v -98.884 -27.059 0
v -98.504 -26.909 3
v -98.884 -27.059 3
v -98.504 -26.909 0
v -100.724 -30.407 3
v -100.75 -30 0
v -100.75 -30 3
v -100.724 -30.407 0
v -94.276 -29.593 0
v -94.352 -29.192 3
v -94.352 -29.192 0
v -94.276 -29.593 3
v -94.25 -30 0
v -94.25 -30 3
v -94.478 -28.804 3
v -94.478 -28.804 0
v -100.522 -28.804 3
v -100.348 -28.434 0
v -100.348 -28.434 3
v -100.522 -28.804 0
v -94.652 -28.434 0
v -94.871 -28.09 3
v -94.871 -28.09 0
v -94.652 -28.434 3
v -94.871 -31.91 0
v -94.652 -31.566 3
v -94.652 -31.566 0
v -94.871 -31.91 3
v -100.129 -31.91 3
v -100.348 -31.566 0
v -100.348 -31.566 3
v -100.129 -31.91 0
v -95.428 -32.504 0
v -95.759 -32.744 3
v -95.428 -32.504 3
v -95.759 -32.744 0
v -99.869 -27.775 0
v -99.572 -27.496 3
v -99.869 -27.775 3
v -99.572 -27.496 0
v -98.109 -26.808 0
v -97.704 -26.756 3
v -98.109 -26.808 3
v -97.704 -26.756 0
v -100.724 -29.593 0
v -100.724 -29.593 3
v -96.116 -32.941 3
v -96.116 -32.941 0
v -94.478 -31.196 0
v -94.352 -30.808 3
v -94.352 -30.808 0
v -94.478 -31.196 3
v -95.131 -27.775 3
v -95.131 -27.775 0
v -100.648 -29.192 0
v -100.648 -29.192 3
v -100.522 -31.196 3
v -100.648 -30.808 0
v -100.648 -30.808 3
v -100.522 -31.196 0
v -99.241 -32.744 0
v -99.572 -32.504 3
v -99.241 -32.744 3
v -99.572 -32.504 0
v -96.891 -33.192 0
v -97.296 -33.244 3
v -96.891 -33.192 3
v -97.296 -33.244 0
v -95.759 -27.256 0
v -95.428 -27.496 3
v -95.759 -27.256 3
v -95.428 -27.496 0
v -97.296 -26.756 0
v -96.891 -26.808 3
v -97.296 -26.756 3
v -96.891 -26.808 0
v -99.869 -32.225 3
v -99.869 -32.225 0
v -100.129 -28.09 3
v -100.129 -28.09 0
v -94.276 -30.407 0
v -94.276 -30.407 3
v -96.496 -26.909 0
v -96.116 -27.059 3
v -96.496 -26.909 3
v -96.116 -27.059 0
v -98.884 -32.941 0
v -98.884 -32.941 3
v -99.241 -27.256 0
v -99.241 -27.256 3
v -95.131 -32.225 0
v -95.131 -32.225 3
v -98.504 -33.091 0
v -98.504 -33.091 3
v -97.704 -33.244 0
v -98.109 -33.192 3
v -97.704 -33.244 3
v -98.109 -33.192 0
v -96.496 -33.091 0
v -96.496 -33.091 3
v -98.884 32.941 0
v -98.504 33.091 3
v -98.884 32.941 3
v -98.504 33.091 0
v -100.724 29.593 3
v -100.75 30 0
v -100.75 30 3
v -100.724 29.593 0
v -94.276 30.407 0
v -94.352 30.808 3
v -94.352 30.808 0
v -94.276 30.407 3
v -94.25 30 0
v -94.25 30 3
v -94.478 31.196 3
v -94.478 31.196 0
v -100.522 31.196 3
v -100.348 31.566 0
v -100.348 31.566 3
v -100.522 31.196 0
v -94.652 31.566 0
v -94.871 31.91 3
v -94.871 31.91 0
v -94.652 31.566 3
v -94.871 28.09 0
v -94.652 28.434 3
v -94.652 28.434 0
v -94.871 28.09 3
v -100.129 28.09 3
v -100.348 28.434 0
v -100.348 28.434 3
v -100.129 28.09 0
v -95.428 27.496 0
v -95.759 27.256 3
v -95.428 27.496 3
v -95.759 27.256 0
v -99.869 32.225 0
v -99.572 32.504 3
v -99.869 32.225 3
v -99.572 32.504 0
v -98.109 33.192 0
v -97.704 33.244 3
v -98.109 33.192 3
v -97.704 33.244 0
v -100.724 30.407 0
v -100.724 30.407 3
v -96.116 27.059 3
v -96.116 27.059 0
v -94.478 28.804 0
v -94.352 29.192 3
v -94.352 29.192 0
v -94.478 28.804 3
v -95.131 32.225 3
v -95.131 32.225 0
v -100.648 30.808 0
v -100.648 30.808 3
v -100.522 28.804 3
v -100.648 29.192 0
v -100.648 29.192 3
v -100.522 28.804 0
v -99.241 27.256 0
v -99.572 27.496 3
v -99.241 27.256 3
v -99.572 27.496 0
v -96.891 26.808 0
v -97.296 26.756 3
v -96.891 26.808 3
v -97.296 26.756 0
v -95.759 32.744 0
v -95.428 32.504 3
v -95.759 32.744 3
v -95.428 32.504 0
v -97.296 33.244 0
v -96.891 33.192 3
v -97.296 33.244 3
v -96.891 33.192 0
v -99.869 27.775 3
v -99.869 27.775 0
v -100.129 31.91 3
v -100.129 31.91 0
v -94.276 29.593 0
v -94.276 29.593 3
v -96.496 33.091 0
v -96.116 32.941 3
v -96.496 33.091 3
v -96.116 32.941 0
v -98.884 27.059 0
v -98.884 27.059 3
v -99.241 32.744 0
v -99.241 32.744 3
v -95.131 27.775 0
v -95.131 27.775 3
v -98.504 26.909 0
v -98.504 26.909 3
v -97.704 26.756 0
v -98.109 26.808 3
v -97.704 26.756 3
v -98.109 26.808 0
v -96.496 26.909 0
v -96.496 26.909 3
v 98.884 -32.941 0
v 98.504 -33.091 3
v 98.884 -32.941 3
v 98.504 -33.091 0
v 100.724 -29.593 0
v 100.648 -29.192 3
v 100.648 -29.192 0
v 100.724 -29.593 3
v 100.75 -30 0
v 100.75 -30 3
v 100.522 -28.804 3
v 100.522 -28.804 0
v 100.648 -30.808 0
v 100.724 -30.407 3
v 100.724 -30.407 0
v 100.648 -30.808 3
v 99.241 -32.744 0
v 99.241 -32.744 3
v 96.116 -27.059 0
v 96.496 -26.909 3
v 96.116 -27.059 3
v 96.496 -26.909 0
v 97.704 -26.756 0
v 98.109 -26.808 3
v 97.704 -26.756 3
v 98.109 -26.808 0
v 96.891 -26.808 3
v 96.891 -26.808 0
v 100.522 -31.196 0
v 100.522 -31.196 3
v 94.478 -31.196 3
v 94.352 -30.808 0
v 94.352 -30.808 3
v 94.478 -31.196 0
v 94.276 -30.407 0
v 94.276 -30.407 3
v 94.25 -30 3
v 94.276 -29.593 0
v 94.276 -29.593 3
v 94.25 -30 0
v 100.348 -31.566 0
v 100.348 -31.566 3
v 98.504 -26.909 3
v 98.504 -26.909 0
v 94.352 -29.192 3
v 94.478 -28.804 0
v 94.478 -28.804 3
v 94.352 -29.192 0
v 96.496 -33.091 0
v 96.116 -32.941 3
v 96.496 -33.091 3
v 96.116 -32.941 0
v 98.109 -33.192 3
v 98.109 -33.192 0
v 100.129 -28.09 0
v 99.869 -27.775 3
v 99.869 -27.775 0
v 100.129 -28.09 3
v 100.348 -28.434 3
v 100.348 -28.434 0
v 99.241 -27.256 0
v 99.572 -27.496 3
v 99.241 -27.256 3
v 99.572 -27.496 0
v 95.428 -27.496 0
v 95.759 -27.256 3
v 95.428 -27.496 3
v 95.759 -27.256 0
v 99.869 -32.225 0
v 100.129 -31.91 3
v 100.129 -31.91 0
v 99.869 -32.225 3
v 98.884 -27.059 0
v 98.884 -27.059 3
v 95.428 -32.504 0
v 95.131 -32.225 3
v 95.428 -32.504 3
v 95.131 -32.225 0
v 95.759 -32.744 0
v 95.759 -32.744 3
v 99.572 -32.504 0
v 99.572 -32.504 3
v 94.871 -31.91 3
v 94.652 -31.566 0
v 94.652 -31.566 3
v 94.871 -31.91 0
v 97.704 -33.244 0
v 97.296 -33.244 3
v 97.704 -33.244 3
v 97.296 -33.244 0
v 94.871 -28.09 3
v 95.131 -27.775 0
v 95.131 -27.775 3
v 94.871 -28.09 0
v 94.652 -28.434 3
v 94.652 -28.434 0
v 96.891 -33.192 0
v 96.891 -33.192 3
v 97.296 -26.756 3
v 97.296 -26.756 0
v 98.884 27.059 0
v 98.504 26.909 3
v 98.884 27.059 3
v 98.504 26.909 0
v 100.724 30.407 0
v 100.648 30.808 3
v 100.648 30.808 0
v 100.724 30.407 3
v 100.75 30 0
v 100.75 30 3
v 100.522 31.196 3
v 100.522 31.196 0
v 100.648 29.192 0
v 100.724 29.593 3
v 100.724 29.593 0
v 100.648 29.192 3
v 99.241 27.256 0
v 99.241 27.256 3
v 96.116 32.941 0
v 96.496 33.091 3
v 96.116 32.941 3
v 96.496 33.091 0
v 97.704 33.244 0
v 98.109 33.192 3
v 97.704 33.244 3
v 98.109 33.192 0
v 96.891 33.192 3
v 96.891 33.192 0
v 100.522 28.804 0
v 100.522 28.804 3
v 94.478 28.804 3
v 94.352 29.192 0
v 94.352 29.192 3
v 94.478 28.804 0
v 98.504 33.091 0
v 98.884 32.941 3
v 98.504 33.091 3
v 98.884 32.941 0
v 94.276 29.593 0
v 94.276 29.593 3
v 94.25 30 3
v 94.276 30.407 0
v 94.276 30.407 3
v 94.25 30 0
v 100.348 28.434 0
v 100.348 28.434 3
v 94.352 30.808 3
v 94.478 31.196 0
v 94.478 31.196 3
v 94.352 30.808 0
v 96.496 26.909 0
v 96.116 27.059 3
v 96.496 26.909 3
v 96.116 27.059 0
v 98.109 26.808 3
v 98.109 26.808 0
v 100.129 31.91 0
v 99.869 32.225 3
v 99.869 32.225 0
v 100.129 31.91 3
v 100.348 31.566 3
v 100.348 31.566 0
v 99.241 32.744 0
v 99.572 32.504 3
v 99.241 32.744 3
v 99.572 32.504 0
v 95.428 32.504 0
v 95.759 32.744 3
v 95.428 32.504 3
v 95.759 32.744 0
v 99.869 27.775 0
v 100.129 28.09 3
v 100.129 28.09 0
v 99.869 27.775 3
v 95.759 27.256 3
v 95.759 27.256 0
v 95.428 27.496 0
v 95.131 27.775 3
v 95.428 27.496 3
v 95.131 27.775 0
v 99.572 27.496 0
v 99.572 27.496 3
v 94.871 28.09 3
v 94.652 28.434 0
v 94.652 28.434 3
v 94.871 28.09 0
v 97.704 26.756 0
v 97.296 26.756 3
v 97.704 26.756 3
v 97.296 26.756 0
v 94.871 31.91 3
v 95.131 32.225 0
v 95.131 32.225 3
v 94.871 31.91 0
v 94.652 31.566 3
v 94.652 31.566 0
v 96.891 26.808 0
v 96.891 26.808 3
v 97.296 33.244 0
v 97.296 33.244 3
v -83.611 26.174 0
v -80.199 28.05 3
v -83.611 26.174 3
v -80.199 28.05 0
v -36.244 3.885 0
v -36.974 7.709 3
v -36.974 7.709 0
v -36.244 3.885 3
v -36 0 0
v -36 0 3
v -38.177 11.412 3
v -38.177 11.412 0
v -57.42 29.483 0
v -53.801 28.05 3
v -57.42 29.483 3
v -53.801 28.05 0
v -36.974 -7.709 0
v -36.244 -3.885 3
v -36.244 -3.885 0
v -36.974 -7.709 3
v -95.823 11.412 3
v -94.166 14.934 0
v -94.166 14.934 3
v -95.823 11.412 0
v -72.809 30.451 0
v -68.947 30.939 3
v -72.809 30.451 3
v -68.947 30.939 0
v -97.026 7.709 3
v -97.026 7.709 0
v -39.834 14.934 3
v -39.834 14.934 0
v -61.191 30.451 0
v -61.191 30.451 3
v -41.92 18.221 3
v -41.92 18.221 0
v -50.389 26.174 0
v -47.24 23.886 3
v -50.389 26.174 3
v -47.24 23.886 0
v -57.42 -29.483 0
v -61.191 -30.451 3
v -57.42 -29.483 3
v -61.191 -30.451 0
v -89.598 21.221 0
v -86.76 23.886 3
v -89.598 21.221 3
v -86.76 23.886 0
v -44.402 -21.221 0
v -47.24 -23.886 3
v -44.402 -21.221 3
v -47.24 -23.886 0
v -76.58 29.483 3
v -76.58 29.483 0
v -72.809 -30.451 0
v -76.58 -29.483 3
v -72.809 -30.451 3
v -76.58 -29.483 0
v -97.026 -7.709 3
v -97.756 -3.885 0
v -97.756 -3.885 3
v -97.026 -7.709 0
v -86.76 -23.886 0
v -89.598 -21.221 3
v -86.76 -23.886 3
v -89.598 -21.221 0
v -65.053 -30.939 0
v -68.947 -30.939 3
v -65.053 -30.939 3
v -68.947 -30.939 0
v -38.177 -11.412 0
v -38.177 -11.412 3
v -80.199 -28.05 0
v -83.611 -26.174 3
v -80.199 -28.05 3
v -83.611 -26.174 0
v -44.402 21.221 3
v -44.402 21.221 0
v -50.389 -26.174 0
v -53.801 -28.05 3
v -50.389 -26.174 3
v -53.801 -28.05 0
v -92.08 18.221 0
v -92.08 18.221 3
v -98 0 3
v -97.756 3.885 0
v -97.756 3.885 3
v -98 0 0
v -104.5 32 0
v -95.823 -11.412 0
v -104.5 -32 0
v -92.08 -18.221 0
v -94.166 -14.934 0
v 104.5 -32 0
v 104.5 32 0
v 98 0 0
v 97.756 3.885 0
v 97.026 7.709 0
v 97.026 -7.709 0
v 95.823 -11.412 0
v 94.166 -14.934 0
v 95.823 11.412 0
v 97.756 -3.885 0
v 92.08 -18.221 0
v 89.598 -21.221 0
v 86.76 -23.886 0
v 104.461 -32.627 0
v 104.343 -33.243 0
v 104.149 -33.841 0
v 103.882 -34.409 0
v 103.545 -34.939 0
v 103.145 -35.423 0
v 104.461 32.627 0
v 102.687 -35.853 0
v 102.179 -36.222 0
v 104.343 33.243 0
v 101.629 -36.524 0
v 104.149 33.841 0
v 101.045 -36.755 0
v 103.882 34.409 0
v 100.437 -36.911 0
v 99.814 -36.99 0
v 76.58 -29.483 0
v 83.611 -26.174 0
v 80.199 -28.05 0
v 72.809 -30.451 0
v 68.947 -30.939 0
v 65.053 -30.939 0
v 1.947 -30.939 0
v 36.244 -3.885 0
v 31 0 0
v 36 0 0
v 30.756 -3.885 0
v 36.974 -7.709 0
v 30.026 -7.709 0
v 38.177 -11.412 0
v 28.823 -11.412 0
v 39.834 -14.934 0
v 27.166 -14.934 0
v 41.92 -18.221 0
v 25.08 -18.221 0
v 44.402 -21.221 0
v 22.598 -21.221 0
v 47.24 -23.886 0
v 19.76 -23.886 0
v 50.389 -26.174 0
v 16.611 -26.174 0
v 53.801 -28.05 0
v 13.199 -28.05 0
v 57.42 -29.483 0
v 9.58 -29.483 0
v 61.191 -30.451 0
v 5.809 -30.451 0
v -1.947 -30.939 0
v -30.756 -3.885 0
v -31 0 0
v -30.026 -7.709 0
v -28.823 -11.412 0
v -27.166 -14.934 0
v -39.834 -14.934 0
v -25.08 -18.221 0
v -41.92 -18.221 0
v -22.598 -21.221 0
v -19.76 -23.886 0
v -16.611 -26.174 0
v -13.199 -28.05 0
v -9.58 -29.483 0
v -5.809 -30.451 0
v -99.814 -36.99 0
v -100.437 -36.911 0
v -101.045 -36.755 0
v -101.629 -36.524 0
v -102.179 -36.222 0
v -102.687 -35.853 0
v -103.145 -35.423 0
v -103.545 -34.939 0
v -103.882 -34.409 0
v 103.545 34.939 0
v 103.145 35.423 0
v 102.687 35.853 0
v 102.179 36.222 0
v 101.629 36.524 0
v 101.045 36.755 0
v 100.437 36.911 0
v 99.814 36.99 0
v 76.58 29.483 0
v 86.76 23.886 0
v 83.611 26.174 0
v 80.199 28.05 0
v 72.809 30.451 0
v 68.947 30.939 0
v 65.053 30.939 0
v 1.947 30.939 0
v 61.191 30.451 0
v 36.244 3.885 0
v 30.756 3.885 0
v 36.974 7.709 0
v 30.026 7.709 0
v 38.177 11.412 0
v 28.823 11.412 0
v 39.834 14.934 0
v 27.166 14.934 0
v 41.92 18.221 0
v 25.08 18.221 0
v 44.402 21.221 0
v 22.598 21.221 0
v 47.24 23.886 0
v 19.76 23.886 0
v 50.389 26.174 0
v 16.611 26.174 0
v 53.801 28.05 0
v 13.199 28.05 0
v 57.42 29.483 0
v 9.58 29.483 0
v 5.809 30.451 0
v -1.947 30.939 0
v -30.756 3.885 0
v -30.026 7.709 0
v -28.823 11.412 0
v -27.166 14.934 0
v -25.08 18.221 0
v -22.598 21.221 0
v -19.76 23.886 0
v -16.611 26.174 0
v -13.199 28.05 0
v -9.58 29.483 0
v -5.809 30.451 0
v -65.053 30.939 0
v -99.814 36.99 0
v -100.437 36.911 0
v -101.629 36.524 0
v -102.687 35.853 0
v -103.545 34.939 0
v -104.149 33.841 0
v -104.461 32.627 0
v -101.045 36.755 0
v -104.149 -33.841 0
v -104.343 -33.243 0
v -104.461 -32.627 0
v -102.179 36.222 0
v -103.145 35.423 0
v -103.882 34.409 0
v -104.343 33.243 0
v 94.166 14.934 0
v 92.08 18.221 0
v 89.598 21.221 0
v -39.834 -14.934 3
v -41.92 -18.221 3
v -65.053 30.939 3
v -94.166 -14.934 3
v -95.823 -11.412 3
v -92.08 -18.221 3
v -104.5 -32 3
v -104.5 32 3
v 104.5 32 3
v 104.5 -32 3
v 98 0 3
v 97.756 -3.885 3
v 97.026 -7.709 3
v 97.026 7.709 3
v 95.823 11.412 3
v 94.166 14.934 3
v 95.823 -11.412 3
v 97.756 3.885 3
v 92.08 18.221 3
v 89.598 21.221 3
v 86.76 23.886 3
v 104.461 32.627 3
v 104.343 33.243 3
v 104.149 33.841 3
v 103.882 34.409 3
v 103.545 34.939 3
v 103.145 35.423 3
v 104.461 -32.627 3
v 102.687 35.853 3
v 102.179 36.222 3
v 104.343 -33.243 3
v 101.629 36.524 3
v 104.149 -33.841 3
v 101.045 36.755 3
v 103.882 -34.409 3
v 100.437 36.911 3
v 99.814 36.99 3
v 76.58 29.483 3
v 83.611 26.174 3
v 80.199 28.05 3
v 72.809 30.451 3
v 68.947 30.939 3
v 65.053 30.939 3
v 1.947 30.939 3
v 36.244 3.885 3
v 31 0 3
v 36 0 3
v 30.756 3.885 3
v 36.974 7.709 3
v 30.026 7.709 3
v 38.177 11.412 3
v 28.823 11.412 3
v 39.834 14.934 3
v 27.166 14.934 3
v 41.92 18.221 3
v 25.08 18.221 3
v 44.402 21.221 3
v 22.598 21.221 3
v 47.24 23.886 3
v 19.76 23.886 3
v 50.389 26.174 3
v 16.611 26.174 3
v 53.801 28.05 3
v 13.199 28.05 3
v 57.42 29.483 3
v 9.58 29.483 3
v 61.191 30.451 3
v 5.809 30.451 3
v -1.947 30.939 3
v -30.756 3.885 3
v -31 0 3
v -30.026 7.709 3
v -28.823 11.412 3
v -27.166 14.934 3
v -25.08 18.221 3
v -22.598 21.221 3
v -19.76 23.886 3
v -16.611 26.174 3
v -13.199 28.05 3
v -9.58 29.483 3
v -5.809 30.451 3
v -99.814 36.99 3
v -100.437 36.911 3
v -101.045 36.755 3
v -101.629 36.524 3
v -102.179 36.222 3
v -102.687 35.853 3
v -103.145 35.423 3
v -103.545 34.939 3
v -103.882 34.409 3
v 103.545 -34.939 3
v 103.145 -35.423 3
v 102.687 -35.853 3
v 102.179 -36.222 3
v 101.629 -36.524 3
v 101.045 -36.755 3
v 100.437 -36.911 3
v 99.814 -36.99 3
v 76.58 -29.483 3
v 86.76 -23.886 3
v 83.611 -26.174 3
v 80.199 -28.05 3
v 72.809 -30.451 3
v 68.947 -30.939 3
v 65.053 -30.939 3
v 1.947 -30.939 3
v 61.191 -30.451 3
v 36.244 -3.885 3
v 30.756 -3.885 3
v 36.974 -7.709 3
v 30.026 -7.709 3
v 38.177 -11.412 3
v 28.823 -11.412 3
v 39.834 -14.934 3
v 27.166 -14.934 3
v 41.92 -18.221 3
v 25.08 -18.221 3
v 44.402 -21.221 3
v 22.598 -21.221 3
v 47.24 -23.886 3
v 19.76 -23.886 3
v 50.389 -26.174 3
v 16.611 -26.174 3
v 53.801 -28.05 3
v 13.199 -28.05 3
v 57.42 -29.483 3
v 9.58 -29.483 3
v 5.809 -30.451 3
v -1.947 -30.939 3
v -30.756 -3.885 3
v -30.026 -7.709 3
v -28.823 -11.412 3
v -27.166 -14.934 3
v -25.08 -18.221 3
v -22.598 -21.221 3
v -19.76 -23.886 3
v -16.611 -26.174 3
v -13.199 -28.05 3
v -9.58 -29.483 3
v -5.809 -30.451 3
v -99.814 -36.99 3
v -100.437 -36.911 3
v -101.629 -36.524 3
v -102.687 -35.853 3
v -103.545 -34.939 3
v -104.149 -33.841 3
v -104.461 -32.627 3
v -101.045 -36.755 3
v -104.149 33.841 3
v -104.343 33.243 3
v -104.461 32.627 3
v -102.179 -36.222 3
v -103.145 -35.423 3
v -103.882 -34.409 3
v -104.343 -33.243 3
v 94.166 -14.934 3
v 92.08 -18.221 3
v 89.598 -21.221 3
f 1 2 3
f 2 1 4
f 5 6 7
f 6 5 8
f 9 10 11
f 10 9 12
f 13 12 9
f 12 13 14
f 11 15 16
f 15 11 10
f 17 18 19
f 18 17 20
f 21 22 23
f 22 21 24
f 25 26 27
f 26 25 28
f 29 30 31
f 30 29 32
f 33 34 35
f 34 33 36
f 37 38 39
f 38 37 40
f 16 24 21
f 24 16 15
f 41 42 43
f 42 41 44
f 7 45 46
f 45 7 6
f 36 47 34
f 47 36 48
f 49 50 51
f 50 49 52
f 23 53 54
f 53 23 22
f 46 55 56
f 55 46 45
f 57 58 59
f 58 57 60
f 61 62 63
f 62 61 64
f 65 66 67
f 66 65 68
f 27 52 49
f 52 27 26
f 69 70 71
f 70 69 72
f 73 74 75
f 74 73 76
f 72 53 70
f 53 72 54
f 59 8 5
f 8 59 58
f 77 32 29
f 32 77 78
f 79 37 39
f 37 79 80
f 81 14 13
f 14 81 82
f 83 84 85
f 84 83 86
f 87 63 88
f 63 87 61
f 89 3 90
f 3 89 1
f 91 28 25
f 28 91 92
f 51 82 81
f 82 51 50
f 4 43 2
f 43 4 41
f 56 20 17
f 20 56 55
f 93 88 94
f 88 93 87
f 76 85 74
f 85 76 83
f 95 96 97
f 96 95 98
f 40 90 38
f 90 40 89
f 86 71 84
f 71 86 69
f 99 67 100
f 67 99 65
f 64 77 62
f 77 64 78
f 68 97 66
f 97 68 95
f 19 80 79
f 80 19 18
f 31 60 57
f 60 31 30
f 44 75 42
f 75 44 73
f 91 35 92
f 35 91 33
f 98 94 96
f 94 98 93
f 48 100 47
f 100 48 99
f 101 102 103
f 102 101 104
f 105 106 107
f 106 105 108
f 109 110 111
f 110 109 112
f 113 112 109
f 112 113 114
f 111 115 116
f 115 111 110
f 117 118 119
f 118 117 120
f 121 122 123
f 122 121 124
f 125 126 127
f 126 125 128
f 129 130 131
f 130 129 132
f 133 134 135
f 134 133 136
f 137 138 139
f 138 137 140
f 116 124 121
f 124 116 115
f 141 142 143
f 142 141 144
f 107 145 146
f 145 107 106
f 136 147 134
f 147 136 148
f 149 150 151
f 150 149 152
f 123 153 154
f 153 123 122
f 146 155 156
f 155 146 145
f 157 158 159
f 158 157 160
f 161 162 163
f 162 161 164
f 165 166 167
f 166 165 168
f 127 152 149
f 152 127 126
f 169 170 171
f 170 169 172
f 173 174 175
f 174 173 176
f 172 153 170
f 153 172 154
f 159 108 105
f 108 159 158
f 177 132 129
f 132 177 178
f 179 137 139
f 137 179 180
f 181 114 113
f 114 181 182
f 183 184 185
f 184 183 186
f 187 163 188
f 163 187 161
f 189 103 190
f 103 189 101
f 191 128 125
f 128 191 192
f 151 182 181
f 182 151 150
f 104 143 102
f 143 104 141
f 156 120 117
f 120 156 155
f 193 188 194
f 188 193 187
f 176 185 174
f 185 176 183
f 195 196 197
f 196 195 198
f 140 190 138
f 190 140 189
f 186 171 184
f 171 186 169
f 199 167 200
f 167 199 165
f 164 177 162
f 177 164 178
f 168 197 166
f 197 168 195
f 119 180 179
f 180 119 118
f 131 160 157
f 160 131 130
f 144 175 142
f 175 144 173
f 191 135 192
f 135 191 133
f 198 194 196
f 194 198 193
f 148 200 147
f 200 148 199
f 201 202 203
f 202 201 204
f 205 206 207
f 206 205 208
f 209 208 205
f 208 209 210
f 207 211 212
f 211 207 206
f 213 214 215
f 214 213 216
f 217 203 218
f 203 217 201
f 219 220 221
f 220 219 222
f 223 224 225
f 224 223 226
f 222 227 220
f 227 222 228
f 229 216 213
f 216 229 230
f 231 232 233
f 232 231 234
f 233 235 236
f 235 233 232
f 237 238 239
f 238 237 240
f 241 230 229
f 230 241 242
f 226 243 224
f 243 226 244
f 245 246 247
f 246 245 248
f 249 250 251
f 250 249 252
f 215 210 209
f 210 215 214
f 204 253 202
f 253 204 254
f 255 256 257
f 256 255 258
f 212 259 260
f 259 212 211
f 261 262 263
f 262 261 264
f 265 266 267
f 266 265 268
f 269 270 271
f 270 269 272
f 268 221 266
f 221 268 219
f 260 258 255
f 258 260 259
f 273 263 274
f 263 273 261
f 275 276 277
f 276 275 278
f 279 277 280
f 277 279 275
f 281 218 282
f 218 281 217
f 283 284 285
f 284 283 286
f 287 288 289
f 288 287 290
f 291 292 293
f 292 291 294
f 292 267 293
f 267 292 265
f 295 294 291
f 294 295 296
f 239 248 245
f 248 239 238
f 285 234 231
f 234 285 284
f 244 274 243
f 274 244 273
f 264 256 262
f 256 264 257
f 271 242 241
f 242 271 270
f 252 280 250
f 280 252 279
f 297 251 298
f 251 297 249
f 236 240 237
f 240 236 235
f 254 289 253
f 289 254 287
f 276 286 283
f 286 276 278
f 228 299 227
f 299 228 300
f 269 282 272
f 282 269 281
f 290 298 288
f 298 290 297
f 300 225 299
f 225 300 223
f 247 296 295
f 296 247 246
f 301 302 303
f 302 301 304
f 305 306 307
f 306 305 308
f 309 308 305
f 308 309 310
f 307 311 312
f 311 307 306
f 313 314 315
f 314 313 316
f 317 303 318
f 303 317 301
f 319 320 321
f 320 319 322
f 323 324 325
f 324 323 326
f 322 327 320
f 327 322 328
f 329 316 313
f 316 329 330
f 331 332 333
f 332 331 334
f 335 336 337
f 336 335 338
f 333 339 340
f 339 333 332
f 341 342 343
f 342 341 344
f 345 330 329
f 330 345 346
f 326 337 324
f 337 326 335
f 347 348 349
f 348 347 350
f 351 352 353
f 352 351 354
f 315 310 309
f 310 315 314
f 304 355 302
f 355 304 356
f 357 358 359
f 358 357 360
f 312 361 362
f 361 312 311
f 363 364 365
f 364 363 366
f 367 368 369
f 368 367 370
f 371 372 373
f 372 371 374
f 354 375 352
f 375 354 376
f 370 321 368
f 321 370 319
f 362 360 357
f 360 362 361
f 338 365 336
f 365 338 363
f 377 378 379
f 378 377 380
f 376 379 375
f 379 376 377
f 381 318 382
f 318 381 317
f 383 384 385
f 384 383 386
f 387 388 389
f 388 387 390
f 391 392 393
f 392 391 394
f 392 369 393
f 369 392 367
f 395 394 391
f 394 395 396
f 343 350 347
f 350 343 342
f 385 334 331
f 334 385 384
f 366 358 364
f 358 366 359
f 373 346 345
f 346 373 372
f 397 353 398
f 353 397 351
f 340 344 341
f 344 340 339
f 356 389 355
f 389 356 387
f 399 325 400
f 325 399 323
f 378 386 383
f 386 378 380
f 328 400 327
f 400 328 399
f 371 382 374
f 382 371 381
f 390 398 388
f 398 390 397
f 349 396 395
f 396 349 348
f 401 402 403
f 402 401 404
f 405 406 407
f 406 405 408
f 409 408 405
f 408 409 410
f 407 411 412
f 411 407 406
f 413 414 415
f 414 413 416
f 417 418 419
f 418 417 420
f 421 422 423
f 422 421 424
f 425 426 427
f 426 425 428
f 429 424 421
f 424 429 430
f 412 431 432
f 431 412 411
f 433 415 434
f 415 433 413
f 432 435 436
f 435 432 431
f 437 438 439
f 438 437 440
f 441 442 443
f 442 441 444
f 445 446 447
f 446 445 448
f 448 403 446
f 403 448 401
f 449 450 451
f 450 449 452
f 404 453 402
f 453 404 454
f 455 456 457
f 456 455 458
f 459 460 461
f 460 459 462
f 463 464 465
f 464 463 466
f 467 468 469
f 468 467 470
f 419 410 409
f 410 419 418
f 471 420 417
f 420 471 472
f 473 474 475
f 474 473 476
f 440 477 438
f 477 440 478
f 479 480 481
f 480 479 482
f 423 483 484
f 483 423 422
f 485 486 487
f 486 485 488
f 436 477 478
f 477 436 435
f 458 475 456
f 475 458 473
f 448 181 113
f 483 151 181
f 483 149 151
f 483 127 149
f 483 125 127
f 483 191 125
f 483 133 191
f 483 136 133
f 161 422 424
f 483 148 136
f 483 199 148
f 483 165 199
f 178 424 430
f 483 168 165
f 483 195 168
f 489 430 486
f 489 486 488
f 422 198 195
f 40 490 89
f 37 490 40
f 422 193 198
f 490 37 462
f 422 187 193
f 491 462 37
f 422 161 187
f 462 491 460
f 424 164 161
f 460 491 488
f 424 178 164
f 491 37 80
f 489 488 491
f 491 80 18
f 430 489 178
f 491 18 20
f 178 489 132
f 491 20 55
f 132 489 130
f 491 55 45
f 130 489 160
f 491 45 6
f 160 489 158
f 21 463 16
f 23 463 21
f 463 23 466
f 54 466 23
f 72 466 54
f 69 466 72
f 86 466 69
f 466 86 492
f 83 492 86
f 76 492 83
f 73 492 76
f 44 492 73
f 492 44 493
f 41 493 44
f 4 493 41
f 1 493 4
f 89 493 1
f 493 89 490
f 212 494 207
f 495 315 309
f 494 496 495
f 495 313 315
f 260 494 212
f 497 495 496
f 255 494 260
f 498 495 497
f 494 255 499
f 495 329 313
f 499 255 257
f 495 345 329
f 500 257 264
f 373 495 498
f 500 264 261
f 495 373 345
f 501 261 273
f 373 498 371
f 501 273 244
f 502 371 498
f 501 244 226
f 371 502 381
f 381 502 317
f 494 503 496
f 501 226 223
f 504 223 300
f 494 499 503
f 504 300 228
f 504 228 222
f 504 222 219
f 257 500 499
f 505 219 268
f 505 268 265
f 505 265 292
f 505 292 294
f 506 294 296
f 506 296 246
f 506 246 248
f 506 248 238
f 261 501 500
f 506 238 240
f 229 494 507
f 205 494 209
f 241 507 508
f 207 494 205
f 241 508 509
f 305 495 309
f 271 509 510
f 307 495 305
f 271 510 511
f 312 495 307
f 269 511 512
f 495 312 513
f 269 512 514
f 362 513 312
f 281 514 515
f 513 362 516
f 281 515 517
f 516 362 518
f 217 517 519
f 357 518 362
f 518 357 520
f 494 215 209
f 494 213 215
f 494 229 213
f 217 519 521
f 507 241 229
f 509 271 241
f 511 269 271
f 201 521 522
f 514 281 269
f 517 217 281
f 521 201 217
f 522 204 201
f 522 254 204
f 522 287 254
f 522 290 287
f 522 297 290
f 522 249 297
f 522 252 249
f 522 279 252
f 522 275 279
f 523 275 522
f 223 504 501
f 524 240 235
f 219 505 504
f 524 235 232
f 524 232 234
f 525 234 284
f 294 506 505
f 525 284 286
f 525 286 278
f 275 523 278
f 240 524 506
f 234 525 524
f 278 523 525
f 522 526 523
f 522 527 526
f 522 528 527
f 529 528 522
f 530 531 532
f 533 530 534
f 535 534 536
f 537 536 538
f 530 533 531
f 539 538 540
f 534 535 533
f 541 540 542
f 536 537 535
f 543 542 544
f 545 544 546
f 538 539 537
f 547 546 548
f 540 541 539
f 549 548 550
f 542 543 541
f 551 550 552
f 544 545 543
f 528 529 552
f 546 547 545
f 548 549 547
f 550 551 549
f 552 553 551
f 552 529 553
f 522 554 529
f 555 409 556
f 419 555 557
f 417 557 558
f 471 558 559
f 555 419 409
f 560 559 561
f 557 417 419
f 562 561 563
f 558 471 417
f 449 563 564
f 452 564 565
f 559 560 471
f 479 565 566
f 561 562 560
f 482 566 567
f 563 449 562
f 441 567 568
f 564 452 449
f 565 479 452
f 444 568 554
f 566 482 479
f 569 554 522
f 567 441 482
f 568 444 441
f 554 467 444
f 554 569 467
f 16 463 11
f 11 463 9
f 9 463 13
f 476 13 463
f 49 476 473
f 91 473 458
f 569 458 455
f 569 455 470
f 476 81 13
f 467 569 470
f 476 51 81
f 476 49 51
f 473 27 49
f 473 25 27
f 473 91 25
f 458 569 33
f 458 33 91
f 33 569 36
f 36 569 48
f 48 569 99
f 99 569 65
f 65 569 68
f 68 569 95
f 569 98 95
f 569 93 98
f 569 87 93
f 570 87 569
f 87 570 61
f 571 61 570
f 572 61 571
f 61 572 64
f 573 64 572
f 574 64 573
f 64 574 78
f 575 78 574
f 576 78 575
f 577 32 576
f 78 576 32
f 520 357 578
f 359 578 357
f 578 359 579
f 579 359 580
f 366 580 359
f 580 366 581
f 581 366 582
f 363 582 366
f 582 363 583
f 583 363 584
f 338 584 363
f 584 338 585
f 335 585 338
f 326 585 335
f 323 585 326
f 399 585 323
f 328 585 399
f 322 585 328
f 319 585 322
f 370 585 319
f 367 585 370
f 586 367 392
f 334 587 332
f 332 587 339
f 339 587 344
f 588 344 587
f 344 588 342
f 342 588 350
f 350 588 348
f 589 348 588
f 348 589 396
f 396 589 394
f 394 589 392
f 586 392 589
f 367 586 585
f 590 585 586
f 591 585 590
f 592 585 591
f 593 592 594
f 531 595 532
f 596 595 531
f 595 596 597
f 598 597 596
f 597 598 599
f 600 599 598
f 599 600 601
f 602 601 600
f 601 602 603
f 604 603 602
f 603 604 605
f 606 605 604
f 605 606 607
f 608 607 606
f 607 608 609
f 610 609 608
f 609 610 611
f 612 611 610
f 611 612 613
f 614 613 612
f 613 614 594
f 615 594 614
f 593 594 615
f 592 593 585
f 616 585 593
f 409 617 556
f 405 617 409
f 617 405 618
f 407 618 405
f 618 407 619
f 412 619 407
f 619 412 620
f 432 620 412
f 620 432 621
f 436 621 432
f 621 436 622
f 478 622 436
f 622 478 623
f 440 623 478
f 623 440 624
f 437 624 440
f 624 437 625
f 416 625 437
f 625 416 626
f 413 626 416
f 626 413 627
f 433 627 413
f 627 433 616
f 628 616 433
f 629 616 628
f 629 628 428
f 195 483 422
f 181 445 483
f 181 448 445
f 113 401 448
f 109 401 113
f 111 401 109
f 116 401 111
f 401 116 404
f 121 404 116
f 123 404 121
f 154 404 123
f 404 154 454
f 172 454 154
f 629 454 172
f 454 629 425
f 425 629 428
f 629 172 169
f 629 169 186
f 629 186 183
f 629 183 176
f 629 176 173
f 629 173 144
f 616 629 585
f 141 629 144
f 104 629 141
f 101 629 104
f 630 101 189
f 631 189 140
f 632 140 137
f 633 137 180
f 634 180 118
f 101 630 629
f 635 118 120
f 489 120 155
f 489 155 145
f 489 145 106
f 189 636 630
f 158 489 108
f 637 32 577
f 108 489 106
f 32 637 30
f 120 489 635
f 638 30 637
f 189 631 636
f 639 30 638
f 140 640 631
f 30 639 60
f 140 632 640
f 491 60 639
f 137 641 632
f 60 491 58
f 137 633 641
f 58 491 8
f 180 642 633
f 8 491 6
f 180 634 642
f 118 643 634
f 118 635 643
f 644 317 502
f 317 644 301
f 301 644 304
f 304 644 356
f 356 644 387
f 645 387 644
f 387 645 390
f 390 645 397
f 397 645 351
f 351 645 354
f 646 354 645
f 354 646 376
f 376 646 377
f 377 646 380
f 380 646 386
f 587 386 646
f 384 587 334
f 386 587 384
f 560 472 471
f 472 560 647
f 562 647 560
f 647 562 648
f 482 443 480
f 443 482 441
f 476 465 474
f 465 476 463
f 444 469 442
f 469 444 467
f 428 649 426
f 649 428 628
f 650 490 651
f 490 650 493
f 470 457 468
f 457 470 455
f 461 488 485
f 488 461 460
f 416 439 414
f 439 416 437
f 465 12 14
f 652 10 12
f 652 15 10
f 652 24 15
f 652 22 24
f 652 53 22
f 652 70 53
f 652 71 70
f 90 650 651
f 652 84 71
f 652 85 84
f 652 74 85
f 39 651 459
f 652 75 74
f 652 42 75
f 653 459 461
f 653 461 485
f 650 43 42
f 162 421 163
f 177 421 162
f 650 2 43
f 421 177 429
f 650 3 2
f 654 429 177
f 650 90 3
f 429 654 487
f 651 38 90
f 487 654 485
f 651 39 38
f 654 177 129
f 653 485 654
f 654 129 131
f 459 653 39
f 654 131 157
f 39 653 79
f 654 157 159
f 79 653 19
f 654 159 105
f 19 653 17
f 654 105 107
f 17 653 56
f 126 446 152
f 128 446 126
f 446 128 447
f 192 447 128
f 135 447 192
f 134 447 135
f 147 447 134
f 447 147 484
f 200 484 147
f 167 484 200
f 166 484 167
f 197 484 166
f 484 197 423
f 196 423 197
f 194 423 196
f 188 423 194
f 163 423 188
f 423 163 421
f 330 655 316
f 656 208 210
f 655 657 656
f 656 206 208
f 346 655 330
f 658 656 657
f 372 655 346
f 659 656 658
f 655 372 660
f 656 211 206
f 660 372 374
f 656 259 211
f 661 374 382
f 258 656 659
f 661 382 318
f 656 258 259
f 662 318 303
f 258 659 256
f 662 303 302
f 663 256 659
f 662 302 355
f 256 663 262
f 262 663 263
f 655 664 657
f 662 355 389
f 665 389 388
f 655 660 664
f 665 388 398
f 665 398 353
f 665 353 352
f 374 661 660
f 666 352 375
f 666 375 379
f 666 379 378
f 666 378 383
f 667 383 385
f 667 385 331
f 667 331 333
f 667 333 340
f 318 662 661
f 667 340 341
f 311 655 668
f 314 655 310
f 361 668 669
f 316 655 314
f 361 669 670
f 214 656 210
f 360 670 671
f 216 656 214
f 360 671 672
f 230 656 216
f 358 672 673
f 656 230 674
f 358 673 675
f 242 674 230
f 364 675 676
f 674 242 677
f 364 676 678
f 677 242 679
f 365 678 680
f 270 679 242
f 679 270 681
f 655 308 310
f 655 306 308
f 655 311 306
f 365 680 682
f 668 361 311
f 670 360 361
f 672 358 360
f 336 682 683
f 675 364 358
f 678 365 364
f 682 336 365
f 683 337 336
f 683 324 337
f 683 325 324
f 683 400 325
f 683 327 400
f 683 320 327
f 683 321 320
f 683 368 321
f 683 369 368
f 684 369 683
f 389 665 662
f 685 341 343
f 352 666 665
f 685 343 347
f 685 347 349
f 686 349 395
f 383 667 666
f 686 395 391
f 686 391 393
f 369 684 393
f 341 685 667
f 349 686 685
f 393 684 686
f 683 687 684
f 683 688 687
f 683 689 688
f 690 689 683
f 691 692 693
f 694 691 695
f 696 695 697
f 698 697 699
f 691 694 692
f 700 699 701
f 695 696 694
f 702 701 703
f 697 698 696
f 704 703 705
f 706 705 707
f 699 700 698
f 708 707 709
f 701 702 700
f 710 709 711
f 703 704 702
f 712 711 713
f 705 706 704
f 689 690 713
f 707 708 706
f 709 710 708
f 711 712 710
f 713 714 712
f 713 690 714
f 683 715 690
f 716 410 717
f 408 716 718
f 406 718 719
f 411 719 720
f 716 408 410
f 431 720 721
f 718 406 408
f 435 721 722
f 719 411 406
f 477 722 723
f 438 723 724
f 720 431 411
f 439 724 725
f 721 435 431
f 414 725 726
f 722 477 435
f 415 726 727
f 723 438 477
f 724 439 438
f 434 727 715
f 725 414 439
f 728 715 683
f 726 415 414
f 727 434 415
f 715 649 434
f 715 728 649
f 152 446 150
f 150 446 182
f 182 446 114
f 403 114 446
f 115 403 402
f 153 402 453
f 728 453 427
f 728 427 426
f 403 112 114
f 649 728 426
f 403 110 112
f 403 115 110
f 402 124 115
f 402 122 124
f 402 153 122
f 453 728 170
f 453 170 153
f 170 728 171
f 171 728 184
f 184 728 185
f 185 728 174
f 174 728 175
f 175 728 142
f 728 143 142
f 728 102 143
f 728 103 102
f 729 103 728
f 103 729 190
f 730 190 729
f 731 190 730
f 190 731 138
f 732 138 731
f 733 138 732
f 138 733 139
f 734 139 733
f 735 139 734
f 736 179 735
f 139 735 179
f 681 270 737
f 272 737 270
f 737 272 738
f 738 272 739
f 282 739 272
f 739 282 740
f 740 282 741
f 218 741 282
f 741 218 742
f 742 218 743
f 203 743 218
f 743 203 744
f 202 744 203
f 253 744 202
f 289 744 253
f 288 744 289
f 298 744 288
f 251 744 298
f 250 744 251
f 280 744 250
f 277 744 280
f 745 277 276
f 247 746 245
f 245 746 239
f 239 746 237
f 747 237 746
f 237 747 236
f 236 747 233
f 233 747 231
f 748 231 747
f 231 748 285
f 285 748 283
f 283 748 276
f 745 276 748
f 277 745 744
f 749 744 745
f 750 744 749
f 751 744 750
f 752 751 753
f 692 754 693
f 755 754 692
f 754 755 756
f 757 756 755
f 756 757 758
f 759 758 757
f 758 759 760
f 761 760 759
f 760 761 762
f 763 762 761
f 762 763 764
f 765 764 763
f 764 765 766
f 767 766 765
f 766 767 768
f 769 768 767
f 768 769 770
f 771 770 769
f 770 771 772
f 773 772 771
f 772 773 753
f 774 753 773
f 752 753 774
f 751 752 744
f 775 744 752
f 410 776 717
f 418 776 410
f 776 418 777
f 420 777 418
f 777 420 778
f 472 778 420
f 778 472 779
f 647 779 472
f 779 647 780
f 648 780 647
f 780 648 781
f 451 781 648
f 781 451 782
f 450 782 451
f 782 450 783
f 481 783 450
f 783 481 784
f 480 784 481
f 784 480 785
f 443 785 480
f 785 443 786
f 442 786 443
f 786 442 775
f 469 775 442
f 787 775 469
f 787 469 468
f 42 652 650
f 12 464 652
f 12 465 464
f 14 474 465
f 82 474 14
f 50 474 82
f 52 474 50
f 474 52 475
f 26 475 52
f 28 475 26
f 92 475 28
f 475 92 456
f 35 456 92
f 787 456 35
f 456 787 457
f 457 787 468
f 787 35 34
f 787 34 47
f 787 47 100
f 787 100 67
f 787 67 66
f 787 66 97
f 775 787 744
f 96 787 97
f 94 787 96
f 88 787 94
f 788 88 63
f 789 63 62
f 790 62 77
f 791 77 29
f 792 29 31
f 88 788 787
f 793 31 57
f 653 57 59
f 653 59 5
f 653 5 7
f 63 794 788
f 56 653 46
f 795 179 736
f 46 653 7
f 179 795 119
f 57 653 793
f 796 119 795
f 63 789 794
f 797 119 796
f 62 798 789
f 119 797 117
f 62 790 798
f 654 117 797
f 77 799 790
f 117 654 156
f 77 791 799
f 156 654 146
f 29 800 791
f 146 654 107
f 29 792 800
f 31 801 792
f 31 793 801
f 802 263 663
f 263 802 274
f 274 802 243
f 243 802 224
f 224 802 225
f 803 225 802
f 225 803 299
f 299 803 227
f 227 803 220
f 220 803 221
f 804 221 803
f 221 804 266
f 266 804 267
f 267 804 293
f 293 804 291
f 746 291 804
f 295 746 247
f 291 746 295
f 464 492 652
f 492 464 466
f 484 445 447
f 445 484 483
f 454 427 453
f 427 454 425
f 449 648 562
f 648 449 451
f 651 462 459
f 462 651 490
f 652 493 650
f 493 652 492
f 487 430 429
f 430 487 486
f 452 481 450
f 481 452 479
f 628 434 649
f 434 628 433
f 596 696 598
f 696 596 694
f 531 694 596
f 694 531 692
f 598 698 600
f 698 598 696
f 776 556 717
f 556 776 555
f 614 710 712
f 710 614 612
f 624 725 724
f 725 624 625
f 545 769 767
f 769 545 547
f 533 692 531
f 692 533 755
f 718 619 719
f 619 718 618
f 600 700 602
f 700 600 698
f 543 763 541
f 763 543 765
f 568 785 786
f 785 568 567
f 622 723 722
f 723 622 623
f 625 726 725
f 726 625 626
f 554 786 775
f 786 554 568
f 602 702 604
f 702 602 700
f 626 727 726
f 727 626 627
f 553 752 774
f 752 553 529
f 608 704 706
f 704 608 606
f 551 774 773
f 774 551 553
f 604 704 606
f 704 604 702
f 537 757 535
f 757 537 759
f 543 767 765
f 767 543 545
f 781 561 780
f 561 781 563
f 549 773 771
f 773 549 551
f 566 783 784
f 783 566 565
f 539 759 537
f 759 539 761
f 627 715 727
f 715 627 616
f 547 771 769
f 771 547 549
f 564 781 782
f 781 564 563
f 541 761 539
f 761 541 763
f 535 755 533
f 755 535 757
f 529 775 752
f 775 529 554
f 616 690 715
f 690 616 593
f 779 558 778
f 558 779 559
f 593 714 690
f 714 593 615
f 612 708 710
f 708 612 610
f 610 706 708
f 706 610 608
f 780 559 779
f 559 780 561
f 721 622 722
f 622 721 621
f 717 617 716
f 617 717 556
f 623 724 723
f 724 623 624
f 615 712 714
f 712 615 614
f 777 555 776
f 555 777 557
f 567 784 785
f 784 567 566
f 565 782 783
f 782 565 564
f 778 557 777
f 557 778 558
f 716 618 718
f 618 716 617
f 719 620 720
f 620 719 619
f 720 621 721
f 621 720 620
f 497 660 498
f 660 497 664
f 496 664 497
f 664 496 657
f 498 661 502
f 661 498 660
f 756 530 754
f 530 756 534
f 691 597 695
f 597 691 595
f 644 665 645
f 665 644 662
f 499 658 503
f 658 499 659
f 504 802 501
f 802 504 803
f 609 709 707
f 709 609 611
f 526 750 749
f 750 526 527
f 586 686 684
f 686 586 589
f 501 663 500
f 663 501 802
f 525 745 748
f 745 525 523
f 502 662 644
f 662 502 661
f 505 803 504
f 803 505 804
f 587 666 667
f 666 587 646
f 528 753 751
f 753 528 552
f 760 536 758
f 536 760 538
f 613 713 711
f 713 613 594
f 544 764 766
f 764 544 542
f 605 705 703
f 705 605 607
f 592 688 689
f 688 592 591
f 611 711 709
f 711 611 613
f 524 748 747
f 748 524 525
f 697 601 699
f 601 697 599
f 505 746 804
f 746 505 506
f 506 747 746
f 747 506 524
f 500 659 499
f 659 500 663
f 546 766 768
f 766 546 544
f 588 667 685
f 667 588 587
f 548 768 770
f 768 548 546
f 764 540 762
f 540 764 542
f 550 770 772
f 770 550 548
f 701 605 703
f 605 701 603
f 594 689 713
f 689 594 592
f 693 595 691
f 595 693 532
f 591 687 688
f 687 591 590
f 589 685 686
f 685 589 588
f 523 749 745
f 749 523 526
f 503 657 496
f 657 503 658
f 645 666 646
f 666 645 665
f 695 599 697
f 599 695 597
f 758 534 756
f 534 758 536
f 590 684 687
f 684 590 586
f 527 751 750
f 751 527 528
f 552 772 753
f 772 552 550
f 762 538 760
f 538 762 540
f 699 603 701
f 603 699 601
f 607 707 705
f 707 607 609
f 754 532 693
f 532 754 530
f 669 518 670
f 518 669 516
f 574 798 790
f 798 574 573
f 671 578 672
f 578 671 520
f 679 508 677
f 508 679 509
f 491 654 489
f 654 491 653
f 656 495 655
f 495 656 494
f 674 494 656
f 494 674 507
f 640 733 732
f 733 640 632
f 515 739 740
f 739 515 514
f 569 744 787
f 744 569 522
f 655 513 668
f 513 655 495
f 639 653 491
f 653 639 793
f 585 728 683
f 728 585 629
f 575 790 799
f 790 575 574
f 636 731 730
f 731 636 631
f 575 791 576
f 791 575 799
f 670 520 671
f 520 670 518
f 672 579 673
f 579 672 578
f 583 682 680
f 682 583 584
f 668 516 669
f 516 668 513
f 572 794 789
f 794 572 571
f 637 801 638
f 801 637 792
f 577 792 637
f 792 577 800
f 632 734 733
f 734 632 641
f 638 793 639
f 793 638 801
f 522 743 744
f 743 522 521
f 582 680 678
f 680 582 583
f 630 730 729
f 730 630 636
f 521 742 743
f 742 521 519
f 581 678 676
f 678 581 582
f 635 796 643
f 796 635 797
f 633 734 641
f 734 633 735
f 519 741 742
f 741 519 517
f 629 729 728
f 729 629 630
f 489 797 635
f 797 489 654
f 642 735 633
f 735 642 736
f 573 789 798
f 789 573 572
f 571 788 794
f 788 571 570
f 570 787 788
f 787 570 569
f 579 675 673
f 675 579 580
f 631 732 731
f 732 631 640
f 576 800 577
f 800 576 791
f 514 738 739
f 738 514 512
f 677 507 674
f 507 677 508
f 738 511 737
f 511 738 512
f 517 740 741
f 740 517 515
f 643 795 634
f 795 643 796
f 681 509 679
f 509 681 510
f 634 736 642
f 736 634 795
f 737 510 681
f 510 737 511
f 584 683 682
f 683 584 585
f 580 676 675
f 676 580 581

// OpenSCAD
$fn = 50;


difference() {
	union() {
		hull() {
			translate(v = [-99.5000000000, 32.0000000000, 0]) {
				cylinder(h = 3, r = 5);
			}
			translate(v = [99.5000000000, 32.0000000000, 0]) {
				cylinder(h = 3, r = 5);
			}
			translate(v = [-99.5000000000, -32.0000000000, 0]) {
				cylinder(h = 3, r = 5);
			}
			translate(v = [99.5000000000, -32.0000000000, 0]) {
				cylinder(h = 3, r = 5);
			}
		}
	}
	union() {
		#translate(v = [-97.5000000000, -30.0000000000, -100.0000000000]) {
			cylinder(h = 200, r = 3.2500000000);
		}
		#translate(v = [-97.5000000000, 30.0000000000, -100.0000000000]) {
			cylinder(h = 200, r = 3.2500000000);
		}
		#translate(v = [97.5000000000, -30.0000000000, -100.0000000000]) {
			cylinder(h = 200, r = 3.2500000000);
		}
		#translate(v = [97.5000000000, 30.0000000000, -100.0000000000]) {
			cylinder(h = 200, r = 3.2500000000);
		}
		#translate(v = [-67.0000000000, 0, 0]) {
			cylinder(h = 3, r = 31.0000000000);
		}
		#cylinder(h = 3, r = 31.0000000000);
		#translate(v = [67.0000000000, 0, 0]) {
			cylinder(h = 3, r = 31.0000000000);
		}
	}
}
